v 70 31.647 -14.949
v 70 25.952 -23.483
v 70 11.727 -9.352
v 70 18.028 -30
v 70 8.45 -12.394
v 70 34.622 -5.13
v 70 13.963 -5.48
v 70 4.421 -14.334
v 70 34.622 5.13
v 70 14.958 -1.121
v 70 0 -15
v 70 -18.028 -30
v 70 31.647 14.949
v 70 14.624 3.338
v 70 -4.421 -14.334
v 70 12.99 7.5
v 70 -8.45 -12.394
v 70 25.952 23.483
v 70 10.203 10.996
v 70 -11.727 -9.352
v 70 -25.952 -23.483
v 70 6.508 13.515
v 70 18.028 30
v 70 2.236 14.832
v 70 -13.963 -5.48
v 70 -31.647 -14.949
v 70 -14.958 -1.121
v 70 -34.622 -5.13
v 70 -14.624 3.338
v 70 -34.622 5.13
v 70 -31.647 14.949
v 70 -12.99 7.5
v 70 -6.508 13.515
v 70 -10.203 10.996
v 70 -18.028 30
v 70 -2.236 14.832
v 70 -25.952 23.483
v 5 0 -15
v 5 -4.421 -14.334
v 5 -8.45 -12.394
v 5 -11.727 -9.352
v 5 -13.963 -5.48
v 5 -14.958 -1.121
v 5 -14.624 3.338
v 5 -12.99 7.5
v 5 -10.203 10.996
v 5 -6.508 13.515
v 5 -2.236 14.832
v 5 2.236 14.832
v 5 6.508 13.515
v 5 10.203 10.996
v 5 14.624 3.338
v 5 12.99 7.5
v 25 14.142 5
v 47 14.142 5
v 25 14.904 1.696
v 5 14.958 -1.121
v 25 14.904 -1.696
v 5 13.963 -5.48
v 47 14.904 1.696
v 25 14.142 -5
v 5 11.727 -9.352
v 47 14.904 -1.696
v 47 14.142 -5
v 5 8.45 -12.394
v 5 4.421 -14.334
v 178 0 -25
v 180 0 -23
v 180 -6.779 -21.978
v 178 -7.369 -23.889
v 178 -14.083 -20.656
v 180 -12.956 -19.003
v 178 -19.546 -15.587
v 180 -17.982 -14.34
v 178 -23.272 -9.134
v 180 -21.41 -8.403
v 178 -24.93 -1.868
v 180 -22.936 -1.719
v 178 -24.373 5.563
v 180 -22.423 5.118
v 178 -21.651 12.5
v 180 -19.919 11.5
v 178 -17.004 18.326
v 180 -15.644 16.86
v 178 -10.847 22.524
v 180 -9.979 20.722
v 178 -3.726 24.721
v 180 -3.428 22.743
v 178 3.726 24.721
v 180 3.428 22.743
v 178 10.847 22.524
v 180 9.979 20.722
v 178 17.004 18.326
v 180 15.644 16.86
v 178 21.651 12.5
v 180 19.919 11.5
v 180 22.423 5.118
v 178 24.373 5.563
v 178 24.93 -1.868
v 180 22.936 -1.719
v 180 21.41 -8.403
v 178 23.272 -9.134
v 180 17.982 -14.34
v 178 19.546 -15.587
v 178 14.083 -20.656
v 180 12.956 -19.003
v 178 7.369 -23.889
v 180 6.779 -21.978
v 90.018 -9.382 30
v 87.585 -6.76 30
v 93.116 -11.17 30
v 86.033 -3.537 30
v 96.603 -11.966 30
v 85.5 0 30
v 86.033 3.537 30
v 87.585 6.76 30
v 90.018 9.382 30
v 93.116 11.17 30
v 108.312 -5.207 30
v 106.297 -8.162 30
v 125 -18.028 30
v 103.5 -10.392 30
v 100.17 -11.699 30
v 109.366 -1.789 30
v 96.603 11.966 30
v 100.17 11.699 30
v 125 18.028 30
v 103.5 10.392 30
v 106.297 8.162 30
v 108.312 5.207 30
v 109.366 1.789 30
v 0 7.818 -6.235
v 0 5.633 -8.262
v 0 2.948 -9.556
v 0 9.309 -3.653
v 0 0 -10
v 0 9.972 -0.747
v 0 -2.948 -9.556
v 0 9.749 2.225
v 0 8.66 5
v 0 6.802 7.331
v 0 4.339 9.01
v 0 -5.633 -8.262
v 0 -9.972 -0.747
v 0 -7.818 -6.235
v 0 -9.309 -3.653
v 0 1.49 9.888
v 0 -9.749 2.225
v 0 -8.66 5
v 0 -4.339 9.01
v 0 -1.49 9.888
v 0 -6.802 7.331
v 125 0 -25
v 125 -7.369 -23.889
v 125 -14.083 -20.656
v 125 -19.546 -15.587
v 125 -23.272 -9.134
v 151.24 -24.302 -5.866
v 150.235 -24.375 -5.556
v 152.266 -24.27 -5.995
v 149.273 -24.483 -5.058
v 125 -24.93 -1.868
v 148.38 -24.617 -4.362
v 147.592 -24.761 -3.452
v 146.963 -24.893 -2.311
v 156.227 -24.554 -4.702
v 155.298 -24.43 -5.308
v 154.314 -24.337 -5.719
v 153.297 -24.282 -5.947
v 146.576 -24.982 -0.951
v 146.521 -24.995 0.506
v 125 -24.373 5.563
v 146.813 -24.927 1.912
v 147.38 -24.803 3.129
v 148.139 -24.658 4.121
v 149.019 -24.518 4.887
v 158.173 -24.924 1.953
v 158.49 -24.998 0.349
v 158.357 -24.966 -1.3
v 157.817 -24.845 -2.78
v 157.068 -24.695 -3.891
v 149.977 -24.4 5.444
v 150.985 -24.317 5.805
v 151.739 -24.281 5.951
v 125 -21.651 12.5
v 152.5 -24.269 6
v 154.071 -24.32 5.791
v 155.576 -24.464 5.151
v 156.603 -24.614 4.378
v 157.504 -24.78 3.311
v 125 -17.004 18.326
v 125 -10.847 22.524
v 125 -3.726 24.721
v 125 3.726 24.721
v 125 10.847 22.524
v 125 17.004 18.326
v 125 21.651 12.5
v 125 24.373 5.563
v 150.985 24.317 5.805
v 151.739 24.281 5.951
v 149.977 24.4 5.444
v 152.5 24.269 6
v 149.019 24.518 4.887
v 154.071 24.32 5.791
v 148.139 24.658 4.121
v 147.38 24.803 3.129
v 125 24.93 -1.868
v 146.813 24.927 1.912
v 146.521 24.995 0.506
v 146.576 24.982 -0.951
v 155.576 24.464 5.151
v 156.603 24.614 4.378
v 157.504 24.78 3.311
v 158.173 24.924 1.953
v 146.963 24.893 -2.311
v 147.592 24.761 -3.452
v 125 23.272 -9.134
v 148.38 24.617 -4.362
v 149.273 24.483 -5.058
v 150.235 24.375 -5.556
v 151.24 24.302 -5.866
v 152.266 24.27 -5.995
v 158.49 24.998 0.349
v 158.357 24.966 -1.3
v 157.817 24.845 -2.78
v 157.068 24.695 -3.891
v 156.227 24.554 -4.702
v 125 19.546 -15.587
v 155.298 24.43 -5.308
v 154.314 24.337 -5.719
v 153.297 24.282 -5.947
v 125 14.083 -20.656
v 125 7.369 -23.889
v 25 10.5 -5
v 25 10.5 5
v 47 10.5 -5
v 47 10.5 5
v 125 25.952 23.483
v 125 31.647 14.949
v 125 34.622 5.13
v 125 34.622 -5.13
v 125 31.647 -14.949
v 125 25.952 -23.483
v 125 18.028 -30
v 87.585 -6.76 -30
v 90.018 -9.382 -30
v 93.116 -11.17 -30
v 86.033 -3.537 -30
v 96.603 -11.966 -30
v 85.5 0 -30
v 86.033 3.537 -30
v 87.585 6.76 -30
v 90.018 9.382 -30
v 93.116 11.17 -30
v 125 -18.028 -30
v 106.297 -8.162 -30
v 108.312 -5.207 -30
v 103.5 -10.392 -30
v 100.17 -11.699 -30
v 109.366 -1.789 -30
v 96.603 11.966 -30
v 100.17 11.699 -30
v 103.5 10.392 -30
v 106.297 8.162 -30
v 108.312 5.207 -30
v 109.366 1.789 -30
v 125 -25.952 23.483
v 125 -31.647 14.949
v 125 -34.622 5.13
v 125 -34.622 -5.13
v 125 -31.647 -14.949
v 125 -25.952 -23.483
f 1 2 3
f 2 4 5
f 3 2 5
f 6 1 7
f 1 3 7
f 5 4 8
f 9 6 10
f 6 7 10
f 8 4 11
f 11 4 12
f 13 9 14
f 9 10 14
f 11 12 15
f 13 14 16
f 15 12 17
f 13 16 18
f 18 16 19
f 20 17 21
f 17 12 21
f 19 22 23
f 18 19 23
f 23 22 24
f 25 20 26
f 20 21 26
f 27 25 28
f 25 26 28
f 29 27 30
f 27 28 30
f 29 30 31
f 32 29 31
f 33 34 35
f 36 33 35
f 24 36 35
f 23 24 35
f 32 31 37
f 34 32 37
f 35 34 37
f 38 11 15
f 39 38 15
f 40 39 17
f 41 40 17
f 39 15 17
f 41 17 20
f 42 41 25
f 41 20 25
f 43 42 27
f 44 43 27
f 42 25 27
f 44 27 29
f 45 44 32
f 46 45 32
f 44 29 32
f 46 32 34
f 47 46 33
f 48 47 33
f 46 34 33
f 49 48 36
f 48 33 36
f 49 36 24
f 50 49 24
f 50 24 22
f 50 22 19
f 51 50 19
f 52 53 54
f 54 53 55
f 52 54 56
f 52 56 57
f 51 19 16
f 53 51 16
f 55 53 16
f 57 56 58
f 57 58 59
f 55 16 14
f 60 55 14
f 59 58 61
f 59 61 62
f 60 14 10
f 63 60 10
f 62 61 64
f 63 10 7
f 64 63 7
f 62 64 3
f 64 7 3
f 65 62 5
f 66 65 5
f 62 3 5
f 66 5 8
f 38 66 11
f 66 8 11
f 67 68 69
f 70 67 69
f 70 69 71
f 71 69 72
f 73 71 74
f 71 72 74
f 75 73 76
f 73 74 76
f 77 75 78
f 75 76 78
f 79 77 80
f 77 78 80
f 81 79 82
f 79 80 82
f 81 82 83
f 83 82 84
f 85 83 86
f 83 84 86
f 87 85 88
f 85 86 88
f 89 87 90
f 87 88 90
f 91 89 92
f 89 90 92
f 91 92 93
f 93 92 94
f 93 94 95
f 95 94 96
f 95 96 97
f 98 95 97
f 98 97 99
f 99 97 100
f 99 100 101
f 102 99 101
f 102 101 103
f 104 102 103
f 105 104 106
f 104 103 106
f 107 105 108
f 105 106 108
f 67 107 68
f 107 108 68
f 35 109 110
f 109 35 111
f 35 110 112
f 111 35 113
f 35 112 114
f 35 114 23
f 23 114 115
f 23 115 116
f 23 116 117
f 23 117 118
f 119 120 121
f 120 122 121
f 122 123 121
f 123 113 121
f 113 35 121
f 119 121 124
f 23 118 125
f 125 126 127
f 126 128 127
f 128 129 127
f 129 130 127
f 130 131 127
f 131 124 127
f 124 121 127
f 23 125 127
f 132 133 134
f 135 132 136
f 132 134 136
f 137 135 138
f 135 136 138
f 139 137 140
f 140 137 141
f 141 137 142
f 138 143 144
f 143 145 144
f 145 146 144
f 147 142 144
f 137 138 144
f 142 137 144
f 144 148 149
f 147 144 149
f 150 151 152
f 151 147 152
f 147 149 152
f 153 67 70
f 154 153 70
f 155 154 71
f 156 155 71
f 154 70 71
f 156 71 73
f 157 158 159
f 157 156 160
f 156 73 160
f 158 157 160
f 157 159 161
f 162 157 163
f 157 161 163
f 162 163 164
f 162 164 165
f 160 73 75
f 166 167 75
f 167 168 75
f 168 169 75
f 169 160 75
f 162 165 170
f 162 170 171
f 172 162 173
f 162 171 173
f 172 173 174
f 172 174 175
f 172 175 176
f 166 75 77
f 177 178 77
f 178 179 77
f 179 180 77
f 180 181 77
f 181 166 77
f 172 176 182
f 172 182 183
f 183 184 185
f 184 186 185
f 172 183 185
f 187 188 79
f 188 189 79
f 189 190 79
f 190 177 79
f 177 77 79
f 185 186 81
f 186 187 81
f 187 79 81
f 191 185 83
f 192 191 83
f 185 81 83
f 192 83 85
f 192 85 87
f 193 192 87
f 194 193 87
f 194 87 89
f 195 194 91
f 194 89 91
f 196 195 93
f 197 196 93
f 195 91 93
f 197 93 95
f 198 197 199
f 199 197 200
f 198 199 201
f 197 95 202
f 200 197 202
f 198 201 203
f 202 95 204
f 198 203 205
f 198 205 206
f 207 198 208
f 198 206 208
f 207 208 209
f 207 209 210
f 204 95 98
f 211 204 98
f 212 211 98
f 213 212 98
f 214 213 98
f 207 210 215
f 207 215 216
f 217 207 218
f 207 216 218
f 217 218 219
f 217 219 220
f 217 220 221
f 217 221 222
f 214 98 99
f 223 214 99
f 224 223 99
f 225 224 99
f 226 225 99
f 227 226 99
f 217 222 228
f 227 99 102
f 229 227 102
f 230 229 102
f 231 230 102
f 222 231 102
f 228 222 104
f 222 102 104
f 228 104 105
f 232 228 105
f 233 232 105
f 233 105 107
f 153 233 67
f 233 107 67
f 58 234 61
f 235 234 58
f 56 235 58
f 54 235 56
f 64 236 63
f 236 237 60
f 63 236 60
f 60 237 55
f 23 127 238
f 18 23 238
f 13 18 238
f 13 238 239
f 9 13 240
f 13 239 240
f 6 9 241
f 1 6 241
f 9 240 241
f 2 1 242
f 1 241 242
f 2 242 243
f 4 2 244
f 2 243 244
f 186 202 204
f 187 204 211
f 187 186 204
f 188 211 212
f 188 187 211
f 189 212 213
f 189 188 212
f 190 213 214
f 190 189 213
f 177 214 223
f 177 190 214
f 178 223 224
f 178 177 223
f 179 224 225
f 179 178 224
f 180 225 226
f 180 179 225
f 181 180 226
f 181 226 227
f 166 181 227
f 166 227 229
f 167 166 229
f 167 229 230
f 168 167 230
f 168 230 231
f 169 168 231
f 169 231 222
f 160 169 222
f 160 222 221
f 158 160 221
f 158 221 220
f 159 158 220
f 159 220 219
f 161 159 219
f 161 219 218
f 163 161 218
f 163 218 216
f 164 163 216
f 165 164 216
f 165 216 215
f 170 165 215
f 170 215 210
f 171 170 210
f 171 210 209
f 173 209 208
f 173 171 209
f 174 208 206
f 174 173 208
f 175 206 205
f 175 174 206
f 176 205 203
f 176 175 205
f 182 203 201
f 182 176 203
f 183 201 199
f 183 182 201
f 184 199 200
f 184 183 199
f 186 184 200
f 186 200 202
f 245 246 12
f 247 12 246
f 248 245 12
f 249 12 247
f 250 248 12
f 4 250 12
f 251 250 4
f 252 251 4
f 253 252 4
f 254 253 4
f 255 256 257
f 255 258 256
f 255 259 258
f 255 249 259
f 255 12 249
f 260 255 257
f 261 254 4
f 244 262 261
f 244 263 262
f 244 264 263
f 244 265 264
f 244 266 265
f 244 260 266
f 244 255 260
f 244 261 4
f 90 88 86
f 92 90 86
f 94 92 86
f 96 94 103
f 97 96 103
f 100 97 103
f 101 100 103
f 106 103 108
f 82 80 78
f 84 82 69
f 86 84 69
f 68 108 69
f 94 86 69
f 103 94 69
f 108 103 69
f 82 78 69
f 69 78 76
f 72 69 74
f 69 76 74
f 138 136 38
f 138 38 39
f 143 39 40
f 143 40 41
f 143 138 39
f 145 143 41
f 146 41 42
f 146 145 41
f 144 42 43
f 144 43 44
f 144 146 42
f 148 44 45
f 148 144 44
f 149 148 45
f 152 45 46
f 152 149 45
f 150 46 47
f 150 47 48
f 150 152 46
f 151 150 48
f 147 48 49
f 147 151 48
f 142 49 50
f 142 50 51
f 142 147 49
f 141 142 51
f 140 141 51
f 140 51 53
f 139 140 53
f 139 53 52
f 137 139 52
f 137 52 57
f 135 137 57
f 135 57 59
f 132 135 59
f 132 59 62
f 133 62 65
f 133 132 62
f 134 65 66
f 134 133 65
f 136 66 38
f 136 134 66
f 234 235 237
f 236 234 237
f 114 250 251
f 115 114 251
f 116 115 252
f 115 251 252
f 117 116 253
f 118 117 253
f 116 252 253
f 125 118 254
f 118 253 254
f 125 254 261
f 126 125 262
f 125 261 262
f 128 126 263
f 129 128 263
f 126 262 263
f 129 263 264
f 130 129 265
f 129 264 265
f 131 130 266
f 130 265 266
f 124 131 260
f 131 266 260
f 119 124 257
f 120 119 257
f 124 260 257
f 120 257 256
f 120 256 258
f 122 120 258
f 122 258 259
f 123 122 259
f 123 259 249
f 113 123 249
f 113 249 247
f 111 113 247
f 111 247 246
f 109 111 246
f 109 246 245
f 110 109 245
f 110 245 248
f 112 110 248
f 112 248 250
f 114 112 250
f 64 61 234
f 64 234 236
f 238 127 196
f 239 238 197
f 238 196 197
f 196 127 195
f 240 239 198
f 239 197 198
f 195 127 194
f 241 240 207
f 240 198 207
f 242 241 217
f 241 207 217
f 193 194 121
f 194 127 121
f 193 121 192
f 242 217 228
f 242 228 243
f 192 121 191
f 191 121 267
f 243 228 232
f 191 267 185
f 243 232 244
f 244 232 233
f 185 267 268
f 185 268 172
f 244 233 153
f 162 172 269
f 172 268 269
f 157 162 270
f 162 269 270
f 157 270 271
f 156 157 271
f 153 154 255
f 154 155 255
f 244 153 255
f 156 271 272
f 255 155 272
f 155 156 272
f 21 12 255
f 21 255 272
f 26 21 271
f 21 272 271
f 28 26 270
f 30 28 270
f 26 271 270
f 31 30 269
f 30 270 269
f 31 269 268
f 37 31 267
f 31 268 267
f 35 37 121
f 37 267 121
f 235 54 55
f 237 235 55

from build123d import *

# Parameters (mm, degrees)
CUT_EXTRUDE_1_DEPTH      = 135.443296597
SKETCH_3_W               = 22
SKETCH_3_H               = 4.5
CUT_EXTRUDE_2_DEPTH      = 5
HOLE_WIZARD_24_0_24_1_D  = 24
CUT_EXTRUDE_3_DEPTH      = 186.809041761
CUT_EXTRUDE_3_DEPTH_BACK = 186.809041761
SKETCH_8_R               = 6
CHAMFER_1_SIZE           = 2
CHAMFER_2_SIZE           = 5


with BuildPart() as part:
    # Эскиз1 → Повернуть1 (revolve)
    with BuildSketch(Plane.XY, mode=Mode.PRIVATE) as revolve_1_sk:
        Polygon((0, 0), (0, 15), (70, 15), (70, 35), (125, 35), (125, 25), (180, 25), (180, 0), align=None)
    revolve(revolve_1_sk.sketch.rotate(Axis((0, 0, 0), (-1, 0, 0)), 90), axis=Axis((0, 0, 0), (-1, 0, 0)))

    # Эскиз2 → Вырез-Вытянуть1 (cut, symmetric)
    with BuildSketch(Plane(origin=(125, 0, 0), x_dir=(0, 0, -1), z_dir=(1, 0, 0))):
        Polygon((-30, 195.8007333), (-30, 18.027756377), (-30, -18.027756377), (-30, -195.8007333), (-385.545953846, -195.8007333), (-385.545953846, 195.8007333), align=None)
    cut_extrude_1 = extrude(amount=CUT_EXTRUDE_1_DEPTH, both=True, mode=Mode.SUBTRACT)

    # Зеркальное отражение1: Вырез-Вытянуть1 across plane
    add(cut_extrude_1.mirror(Plane.XY), mode=Mode.SUBTRACT)

    # Эскиз3 → Вырез-Вытянуть2 (cut, symmetric)
    with BuildSketch(Plane.XY):
        with Locations((36, 12.75)):
            Rectangle(SKETCH_3_W, SKETCH_3_H)
    extrude(amount=CUT_EXTRUDE_2_DEPTH, both=True, mode=Mode.SUBTRACT)

    # Диаметр отверстия Ø24.0 (24)1 (through all)
    with Locations(Plane.XY.offset(30)):
        with Locations((97.5, 0)):
            Hole(HOLE_WIZARD_24_0_24_1_D / 2)

    # Эскиз8 → Вырез-Вытянуть3 (cut, two sides: drawn at the far end of the back side and taken through both)
    with BuildSketch(Plane(origin=(0, 0, 0), x_dir=(1, 0, 0), z_dir=(0, 1, 0)).offset(-CUT_EXTRUDE_3_DEPTH_BACK)):
        with Locations(Location((152.5, 0, 0), (0, 0, 270))):
            Circle(SKETCH_8_R)
    extrude(amount=CUT_EXTRUDE_3_DEPTH + CUT_EXTRUDE_3_DEPTH_BACK, mode=Mode.SUBTRACT)

    # Фаска1
    chamfer_1_edges = [part.edges().sort_by_distance(p)[0] for p in [
        (180, 0, 25),
    ]]
    chamfer(chamfer_1_edges, length=CHAMFER_1_SIZE)

    # Фаска2
    chamfer_2_edges = [part.edges().sort_by_distance(p)[0] for p in [
        (0, 0, 15),
    ]]
    chamfer(chamfer_2_edges, length=CHAMFER_2_SIZE)


solid = part.part
